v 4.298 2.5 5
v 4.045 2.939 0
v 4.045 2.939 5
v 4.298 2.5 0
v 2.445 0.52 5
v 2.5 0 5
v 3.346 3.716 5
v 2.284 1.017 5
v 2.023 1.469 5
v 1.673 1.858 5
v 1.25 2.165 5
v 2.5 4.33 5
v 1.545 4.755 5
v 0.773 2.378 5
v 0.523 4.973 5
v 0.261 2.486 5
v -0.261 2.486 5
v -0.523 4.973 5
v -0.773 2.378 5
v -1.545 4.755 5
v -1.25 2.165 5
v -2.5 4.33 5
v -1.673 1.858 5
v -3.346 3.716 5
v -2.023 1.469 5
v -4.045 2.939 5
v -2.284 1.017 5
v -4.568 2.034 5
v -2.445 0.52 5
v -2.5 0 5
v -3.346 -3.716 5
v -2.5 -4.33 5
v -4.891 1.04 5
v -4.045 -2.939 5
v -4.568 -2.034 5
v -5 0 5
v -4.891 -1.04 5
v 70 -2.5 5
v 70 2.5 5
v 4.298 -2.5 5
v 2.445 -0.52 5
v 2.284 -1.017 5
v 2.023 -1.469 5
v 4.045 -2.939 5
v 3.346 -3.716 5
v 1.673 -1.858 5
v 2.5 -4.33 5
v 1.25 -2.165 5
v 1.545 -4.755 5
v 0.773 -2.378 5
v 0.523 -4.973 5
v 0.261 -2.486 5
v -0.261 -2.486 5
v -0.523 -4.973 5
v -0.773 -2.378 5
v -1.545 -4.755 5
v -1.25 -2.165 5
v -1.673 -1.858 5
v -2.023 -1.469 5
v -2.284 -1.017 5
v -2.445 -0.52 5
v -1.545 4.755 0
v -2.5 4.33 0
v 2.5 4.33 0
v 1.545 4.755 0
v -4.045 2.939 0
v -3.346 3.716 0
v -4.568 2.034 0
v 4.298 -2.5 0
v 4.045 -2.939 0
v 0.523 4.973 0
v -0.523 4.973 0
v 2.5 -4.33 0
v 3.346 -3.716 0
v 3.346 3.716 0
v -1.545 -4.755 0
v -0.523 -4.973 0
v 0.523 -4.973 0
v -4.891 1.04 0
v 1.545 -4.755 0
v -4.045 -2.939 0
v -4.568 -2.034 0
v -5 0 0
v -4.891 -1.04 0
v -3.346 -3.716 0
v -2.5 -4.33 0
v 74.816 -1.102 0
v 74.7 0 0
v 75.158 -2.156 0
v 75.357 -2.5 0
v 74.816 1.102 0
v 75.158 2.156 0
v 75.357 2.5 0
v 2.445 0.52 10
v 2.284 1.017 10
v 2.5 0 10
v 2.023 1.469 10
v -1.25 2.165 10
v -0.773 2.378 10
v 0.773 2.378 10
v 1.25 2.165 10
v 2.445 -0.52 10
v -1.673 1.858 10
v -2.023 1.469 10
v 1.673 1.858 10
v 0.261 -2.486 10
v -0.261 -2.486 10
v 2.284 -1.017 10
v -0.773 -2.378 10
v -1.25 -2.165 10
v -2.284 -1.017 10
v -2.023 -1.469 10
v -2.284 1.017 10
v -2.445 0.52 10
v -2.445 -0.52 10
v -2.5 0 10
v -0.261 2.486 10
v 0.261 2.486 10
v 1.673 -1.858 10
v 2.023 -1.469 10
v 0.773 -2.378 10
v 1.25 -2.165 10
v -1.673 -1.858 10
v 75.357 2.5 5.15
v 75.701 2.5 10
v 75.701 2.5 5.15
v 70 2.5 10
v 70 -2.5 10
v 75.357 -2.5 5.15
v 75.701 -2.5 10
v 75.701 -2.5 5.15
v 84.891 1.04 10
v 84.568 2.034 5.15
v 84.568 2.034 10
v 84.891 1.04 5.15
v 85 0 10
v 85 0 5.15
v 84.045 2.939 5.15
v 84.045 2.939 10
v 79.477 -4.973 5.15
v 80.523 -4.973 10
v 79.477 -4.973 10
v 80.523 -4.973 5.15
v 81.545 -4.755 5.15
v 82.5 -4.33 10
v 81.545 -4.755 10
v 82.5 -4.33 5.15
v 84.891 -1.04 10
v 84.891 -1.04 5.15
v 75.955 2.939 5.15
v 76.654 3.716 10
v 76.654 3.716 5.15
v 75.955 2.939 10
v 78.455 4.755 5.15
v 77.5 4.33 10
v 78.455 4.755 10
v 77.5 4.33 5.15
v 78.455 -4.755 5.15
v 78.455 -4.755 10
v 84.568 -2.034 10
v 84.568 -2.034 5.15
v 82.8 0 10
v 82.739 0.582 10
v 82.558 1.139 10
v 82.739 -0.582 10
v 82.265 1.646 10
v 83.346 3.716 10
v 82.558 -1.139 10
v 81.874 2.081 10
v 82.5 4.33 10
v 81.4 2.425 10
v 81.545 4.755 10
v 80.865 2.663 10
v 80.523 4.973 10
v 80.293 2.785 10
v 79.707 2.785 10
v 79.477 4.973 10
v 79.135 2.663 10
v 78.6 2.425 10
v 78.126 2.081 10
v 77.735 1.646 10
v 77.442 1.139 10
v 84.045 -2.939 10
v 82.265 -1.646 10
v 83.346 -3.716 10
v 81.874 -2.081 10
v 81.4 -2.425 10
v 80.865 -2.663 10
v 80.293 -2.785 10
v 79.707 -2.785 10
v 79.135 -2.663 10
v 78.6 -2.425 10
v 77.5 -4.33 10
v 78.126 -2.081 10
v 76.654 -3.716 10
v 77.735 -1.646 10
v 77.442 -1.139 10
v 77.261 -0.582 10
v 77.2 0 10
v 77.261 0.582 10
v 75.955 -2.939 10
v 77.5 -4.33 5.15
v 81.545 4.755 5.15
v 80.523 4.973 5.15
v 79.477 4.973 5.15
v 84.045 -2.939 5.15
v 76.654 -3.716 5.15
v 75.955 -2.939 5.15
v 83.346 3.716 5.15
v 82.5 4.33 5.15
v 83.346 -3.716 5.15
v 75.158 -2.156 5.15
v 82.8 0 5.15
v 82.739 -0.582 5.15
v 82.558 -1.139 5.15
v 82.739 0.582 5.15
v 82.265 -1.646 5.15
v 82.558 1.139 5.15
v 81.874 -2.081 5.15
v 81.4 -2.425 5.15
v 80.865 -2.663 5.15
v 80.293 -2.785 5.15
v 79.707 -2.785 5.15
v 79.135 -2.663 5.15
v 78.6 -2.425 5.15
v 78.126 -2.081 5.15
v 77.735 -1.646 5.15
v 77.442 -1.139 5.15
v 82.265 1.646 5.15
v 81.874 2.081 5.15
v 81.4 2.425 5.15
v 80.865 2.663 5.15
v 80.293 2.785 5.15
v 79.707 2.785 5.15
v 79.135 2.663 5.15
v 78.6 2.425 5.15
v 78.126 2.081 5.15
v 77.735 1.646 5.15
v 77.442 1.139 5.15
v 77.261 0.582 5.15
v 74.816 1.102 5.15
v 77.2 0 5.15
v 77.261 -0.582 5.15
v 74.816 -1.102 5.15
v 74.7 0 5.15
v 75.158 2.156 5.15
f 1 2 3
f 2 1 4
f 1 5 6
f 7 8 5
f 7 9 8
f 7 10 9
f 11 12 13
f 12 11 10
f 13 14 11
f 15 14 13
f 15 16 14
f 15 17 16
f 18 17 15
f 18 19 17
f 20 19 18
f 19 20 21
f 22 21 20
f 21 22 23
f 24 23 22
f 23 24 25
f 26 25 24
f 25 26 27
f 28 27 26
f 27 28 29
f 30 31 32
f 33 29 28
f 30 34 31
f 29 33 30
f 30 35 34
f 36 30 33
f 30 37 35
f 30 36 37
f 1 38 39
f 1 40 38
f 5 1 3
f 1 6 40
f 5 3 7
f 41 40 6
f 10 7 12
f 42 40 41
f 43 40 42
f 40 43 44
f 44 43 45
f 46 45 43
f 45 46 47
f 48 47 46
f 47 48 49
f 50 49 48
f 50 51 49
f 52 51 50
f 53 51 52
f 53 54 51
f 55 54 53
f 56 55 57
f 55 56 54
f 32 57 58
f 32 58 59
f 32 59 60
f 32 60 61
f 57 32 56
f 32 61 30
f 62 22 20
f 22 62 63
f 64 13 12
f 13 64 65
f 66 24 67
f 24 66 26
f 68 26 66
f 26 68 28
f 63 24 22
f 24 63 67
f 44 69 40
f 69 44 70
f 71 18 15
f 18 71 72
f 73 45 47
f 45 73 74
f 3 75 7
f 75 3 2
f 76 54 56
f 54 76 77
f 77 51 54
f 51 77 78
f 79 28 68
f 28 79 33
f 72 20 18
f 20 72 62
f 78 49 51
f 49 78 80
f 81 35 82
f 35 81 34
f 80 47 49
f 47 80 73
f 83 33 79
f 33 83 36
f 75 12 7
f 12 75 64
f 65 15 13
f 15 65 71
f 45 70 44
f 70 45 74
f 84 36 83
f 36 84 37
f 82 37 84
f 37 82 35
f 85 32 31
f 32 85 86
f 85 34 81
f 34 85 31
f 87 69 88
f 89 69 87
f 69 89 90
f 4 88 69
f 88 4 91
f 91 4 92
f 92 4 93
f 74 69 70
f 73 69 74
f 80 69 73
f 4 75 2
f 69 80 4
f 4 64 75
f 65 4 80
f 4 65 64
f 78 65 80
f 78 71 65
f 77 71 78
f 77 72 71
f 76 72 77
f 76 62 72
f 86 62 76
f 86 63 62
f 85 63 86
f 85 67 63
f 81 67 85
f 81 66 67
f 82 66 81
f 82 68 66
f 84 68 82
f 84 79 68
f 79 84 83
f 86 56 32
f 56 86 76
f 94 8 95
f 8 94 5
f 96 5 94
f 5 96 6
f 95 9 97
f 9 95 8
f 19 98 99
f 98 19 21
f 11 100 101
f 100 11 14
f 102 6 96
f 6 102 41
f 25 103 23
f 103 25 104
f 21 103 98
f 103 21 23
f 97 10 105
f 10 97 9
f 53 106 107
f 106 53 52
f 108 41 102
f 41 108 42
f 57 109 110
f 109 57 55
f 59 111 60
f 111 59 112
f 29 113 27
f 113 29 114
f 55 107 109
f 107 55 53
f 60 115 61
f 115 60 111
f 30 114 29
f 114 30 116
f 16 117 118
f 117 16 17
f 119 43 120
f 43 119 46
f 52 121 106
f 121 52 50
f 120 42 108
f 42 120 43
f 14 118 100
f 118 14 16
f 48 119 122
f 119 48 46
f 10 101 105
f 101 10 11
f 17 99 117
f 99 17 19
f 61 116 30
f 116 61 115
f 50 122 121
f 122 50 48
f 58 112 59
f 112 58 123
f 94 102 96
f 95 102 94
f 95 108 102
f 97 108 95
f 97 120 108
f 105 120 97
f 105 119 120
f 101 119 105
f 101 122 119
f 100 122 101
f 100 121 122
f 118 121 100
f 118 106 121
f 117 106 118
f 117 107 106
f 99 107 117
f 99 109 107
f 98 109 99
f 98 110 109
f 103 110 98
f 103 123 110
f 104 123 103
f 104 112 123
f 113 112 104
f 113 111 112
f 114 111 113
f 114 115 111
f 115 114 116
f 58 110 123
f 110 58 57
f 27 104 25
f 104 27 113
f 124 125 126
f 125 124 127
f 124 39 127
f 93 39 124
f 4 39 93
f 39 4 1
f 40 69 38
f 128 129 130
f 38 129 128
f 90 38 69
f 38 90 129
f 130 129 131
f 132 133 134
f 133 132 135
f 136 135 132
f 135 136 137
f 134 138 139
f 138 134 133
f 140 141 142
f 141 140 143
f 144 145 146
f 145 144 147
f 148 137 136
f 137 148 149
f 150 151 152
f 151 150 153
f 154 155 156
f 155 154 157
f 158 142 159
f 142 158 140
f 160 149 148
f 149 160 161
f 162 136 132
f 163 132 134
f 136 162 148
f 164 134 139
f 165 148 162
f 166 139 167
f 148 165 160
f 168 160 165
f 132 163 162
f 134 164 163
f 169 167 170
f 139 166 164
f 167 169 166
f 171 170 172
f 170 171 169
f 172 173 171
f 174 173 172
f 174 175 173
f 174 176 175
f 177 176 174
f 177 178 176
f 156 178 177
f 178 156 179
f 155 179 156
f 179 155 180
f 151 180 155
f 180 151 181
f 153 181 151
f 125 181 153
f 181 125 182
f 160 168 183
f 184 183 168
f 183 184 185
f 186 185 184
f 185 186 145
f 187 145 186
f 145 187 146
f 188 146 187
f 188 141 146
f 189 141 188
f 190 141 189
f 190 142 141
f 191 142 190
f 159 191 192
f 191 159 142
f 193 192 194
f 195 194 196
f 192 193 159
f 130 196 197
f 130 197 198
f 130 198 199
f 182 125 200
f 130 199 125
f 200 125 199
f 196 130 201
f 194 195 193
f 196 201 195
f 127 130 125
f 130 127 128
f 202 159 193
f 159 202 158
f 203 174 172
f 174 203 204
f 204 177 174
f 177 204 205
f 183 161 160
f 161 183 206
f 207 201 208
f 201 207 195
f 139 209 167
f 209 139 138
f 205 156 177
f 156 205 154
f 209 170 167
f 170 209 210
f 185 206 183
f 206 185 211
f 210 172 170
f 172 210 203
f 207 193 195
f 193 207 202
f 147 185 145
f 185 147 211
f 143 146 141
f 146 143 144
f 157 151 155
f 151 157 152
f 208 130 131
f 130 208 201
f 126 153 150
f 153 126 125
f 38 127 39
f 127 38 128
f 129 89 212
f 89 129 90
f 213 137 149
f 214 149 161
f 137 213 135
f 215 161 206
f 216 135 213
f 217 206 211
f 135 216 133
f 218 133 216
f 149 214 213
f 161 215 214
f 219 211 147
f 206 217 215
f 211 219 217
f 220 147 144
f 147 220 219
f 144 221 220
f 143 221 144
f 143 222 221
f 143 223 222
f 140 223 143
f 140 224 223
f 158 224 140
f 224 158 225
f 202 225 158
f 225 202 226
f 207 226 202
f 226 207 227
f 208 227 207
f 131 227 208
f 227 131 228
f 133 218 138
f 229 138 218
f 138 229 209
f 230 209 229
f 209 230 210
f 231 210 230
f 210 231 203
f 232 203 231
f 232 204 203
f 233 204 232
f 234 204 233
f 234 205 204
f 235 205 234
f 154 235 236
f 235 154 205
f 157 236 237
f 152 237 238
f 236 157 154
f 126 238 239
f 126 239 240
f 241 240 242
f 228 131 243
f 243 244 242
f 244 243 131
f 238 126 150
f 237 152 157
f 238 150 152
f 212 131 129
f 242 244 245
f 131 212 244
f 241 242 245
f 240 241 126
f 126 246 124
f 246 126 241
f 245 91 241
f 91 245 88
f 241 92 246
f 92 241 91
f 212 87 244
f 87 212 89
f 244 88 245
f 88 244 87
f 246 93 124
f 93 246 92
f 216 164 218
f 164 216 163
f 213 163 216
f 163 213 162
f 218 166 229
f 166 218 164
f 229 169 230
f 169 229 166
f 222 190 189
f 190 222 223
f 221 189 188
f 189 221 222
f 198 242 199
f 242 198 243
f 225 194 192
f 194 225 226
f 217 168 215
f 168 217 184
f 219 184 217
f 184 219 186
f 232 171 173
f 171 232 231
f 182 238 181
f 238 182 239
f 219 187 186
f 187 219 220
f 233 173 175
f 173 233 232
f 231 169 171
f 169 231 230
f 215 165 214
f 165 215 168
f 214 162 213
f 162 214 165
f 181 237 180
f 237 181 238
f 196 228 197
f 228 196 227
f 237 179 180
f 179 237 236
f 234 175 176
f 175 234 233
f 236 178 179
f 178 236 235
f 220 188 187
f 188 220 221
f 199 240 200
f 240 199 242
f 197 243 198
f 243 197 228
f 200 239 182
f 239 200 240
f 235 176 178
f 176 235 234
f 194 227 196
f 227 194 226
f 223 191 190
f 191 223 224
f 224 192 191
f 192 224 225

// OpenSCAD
/**
 * Copyright 2018 Nathan Fairhurst.
 */

module male(
  height, // the height of the entire piece
  width, // width of the entire piece
  tolerance // Room for error
) {
  translate([0,0, -tolerance / 2])
    union()
      cylinder(height / 2 + tolerance, width / 2 + tolerance, width / 2 + tolerance);
      cylinder(height + tolerance, width / 4 + tolerance, width / 4 + tolerance);
}

module link(
  height, // the height of the entire piece
  width, // diameter of the largest cylinder
  arm_length, // center to center distance
  tolerance // Room for error
) {
  difference() {
    union() {
      male(height, width, 0);
      translate([0, -width / 4, 0])
        cube([arm_length, width / 2, height / 2]);
      translate([arm_length, 0, 0])
        cylinder(height, width / 2, width / 2);
      translate([arm_length - width , -width / 4, 0])
        cube([width, width / 2, height]);
    }
    translate([arm_length, 0, 0])
      male(height,width,tolerance);
  }
}

link(
  10, // height
  10, // width
  80, // arm_length
  0.3, // tolerance
  $fn=30
);
